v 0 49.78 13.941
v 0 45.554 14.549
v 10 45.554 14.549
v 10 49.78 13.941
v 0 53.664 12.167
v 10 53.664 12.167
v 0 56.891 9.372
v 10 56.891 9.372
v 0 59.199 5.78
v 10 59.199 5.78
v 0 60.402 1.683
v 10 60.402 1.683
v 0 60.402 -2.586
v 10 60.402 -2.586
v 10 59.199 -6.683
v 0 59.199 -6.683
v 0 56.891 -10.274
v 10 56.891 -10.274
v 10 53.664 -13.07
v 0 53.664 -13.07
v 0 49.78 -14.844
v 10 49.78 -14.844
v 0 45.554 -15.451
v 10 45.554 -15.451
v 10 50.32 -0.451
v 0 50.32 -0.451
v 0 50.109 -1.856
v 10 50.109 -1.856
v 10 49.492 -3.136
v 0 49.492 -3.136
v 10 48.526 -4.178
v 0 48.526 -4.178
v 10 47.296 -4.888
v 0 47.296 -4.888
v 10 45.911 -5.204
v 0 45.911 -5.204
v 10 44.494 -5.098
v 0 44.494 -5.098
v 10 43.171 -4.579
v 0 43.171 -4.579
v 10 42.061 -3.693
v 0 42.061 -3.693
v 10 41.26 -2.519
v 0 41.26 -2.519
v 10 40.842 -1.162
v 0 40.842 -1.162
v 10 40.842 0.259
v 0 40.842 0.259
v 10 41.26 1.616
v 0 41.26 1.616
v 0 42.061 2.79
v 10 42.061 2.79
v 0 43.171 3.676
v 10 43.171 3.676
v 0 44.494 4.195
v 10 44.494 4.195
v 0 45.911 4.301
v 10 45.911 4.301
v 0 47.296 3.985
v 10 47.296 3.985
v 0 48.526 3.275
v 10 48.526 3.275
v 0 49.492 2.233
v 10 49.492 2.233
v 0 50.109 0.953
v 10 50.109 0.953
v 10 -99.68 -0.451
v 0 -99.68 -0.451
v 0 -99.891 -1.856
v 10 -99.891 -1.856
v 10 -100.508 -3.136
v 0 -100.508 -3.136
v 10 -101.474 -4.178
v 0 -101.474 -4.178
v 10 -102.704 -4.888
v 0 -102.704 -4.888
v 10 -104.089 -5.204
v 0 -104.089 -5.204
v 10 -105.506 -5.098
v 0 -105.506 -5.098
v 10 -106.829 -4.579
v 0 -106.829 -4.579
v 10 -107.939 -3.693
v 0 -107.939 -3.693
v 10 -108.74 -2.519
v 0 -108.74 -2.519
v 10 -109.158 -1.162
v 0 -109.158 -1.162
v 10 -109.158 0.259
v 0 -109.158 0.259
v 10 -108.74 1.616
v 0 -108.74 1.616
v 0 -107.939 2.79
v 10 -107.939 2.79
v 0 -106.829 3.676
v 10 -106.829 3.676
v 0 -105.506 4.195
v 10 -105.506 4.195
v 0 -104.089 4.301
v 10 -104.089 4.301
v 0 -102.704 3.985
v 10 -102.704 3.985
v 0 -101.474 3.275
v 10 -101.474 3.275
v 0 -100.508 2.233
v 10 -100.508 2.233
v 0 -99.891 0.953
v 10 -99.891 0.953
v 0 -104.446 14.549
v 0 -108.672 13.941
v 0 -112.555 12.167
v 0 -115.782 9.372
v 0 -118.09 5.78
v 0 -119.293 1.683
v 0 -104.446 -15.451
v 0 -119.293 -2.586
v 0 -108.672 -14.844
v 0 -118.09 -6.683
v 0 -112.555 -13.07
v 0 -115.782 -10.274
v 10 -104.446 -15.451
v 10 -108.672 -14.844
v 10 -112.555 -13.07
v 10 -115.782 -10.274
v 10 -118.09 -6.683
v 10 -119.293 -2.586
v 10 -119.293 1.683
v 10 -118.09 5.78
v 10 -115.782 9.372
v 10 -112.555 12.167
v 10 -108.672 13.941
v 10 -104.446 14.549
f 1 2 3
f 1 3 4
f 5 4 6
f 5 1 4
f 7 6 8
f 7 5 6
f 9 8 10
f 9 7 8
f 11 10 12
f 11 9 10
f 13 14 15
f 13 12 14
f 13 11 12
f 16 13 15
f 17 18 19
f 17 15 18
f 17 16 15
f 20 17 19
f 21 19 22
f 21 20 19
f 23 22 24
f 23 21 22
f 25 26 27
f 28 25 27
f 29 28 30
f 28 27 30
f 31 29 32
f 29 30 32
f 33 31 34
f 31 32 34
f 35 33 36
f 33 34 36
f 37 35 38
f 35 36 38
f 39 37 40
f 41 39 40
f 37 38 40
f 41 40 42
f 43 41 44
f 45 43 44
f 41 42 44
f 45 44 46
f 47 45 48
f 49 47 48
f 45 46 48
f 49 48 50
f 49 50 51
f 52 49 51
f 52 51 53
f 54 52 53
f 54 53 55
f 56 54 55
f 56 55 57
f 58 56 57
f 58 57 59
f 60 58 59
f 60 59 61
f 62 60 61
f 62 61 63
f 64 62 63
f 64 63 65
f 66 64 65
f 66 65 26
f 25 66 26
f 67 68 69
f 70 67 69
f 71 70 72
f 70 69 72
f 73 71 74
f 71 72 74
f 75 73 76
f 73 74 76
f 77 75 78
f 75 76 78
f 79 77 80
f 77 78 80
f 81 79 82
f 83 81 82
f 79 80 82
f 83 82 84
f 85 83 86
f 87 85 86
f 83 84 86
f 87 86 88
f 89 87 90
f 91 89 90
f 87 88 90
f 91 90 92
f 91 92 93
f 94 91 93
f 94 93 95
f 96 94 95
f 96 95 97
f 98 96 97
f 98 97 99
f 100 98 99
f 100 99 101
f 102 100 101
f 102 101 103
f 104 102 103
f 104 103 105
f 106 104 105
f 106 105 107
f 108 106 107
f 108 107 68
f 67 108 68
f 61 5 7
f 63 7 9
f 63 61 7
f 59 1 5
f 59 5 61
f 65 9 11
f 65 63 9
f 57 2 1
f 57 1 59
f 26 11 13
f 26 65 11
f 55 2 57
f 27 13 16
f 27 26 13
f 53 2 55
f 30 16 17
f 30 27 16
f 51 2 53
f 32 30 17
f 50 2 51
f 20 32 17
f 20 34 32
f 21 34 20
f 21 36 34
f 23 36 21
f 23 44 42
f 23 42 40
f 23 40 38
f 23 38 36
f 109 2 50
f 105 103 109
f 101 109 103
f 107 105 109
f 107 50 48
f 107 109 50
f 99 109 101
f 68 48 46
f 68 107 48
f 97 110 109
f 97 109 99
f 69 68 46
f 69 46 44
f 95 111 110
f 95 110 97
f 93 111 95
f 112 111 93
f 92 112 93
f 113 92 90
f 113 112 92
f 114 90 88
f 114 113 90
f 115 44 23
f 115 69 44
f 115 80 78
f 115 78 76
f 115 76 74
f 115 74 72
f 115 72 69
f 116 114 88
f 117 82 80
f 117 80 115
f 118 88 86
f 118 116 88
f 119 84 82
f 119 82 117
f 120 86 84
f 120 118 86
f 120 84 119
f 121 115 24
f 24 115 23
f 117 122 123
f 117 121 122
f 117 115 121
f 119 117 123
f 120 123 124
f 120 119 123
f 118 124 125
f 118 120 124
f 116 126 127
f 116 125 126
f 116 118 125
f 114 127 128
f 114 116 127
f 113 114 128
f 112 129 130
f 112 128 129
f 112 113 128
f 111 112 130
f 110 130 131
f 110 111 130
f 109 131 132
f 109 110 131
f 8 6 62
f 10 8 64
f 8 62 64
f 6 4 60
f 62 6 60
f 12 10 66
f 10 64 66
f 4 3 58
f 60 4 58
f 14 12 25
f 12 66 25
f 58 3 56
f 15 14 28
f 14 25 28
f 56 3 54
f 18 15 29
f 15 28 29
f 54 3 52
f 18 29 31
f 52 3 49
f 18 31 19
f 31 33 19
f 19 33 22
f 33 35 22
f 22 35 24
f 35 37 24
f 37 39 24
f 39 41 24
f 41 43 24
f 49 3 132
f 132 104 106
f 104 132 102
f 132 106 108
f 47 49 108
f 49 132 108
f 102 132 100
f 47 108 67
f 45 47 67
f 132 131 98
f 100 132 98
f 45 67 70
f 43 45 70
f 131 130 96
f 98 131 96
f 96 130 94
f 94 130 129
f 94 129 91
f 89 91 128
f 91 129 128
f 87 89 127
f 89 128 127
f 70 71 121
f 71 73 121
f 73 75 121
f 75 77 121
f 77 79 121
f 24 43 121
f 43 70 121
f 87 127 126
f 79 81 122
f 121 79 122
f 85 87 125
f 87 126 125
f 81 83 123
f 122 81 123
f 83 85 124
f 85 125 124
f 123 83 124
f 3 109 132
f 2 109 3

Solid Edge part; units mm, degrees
sketch "Sketch1" plane through (0, 0, 0) normal (1, 0, 0) x (0, 1, 0)
  line L0 (-104.4456, 14.5486) -> (45.5544, 14.5486)
  arc A0 (45.5544, -15.4514) -> (45.5544, 14.5486) centre (45.5544, -0.4514) ccw
  line L1 (-104.4456, -15.4514) -> (45.5544, -15.4514)
  arc A1 (-104.4456, 14.5486) -> (-104.4456, -15.4514) centre (-104.4456, -0.4514) ccw
extrude "Protrusion1" add sketch "Sketch1" along normal blind 10
sketch "Sketch2" plane through (0, 0, 0) normal (1, 0, 0) x (0, 1, 0)
  circle A0 centre (-104.4456, -0.4514) radius 4.7659
  circle A1 centre (45.5544, -0.4514) radius 4.7659
  dimension "D1" = 150
  dimension "D2" = 15
extrude "Cutout1" cut sketch "Sketch2" along normal blind 53.975
